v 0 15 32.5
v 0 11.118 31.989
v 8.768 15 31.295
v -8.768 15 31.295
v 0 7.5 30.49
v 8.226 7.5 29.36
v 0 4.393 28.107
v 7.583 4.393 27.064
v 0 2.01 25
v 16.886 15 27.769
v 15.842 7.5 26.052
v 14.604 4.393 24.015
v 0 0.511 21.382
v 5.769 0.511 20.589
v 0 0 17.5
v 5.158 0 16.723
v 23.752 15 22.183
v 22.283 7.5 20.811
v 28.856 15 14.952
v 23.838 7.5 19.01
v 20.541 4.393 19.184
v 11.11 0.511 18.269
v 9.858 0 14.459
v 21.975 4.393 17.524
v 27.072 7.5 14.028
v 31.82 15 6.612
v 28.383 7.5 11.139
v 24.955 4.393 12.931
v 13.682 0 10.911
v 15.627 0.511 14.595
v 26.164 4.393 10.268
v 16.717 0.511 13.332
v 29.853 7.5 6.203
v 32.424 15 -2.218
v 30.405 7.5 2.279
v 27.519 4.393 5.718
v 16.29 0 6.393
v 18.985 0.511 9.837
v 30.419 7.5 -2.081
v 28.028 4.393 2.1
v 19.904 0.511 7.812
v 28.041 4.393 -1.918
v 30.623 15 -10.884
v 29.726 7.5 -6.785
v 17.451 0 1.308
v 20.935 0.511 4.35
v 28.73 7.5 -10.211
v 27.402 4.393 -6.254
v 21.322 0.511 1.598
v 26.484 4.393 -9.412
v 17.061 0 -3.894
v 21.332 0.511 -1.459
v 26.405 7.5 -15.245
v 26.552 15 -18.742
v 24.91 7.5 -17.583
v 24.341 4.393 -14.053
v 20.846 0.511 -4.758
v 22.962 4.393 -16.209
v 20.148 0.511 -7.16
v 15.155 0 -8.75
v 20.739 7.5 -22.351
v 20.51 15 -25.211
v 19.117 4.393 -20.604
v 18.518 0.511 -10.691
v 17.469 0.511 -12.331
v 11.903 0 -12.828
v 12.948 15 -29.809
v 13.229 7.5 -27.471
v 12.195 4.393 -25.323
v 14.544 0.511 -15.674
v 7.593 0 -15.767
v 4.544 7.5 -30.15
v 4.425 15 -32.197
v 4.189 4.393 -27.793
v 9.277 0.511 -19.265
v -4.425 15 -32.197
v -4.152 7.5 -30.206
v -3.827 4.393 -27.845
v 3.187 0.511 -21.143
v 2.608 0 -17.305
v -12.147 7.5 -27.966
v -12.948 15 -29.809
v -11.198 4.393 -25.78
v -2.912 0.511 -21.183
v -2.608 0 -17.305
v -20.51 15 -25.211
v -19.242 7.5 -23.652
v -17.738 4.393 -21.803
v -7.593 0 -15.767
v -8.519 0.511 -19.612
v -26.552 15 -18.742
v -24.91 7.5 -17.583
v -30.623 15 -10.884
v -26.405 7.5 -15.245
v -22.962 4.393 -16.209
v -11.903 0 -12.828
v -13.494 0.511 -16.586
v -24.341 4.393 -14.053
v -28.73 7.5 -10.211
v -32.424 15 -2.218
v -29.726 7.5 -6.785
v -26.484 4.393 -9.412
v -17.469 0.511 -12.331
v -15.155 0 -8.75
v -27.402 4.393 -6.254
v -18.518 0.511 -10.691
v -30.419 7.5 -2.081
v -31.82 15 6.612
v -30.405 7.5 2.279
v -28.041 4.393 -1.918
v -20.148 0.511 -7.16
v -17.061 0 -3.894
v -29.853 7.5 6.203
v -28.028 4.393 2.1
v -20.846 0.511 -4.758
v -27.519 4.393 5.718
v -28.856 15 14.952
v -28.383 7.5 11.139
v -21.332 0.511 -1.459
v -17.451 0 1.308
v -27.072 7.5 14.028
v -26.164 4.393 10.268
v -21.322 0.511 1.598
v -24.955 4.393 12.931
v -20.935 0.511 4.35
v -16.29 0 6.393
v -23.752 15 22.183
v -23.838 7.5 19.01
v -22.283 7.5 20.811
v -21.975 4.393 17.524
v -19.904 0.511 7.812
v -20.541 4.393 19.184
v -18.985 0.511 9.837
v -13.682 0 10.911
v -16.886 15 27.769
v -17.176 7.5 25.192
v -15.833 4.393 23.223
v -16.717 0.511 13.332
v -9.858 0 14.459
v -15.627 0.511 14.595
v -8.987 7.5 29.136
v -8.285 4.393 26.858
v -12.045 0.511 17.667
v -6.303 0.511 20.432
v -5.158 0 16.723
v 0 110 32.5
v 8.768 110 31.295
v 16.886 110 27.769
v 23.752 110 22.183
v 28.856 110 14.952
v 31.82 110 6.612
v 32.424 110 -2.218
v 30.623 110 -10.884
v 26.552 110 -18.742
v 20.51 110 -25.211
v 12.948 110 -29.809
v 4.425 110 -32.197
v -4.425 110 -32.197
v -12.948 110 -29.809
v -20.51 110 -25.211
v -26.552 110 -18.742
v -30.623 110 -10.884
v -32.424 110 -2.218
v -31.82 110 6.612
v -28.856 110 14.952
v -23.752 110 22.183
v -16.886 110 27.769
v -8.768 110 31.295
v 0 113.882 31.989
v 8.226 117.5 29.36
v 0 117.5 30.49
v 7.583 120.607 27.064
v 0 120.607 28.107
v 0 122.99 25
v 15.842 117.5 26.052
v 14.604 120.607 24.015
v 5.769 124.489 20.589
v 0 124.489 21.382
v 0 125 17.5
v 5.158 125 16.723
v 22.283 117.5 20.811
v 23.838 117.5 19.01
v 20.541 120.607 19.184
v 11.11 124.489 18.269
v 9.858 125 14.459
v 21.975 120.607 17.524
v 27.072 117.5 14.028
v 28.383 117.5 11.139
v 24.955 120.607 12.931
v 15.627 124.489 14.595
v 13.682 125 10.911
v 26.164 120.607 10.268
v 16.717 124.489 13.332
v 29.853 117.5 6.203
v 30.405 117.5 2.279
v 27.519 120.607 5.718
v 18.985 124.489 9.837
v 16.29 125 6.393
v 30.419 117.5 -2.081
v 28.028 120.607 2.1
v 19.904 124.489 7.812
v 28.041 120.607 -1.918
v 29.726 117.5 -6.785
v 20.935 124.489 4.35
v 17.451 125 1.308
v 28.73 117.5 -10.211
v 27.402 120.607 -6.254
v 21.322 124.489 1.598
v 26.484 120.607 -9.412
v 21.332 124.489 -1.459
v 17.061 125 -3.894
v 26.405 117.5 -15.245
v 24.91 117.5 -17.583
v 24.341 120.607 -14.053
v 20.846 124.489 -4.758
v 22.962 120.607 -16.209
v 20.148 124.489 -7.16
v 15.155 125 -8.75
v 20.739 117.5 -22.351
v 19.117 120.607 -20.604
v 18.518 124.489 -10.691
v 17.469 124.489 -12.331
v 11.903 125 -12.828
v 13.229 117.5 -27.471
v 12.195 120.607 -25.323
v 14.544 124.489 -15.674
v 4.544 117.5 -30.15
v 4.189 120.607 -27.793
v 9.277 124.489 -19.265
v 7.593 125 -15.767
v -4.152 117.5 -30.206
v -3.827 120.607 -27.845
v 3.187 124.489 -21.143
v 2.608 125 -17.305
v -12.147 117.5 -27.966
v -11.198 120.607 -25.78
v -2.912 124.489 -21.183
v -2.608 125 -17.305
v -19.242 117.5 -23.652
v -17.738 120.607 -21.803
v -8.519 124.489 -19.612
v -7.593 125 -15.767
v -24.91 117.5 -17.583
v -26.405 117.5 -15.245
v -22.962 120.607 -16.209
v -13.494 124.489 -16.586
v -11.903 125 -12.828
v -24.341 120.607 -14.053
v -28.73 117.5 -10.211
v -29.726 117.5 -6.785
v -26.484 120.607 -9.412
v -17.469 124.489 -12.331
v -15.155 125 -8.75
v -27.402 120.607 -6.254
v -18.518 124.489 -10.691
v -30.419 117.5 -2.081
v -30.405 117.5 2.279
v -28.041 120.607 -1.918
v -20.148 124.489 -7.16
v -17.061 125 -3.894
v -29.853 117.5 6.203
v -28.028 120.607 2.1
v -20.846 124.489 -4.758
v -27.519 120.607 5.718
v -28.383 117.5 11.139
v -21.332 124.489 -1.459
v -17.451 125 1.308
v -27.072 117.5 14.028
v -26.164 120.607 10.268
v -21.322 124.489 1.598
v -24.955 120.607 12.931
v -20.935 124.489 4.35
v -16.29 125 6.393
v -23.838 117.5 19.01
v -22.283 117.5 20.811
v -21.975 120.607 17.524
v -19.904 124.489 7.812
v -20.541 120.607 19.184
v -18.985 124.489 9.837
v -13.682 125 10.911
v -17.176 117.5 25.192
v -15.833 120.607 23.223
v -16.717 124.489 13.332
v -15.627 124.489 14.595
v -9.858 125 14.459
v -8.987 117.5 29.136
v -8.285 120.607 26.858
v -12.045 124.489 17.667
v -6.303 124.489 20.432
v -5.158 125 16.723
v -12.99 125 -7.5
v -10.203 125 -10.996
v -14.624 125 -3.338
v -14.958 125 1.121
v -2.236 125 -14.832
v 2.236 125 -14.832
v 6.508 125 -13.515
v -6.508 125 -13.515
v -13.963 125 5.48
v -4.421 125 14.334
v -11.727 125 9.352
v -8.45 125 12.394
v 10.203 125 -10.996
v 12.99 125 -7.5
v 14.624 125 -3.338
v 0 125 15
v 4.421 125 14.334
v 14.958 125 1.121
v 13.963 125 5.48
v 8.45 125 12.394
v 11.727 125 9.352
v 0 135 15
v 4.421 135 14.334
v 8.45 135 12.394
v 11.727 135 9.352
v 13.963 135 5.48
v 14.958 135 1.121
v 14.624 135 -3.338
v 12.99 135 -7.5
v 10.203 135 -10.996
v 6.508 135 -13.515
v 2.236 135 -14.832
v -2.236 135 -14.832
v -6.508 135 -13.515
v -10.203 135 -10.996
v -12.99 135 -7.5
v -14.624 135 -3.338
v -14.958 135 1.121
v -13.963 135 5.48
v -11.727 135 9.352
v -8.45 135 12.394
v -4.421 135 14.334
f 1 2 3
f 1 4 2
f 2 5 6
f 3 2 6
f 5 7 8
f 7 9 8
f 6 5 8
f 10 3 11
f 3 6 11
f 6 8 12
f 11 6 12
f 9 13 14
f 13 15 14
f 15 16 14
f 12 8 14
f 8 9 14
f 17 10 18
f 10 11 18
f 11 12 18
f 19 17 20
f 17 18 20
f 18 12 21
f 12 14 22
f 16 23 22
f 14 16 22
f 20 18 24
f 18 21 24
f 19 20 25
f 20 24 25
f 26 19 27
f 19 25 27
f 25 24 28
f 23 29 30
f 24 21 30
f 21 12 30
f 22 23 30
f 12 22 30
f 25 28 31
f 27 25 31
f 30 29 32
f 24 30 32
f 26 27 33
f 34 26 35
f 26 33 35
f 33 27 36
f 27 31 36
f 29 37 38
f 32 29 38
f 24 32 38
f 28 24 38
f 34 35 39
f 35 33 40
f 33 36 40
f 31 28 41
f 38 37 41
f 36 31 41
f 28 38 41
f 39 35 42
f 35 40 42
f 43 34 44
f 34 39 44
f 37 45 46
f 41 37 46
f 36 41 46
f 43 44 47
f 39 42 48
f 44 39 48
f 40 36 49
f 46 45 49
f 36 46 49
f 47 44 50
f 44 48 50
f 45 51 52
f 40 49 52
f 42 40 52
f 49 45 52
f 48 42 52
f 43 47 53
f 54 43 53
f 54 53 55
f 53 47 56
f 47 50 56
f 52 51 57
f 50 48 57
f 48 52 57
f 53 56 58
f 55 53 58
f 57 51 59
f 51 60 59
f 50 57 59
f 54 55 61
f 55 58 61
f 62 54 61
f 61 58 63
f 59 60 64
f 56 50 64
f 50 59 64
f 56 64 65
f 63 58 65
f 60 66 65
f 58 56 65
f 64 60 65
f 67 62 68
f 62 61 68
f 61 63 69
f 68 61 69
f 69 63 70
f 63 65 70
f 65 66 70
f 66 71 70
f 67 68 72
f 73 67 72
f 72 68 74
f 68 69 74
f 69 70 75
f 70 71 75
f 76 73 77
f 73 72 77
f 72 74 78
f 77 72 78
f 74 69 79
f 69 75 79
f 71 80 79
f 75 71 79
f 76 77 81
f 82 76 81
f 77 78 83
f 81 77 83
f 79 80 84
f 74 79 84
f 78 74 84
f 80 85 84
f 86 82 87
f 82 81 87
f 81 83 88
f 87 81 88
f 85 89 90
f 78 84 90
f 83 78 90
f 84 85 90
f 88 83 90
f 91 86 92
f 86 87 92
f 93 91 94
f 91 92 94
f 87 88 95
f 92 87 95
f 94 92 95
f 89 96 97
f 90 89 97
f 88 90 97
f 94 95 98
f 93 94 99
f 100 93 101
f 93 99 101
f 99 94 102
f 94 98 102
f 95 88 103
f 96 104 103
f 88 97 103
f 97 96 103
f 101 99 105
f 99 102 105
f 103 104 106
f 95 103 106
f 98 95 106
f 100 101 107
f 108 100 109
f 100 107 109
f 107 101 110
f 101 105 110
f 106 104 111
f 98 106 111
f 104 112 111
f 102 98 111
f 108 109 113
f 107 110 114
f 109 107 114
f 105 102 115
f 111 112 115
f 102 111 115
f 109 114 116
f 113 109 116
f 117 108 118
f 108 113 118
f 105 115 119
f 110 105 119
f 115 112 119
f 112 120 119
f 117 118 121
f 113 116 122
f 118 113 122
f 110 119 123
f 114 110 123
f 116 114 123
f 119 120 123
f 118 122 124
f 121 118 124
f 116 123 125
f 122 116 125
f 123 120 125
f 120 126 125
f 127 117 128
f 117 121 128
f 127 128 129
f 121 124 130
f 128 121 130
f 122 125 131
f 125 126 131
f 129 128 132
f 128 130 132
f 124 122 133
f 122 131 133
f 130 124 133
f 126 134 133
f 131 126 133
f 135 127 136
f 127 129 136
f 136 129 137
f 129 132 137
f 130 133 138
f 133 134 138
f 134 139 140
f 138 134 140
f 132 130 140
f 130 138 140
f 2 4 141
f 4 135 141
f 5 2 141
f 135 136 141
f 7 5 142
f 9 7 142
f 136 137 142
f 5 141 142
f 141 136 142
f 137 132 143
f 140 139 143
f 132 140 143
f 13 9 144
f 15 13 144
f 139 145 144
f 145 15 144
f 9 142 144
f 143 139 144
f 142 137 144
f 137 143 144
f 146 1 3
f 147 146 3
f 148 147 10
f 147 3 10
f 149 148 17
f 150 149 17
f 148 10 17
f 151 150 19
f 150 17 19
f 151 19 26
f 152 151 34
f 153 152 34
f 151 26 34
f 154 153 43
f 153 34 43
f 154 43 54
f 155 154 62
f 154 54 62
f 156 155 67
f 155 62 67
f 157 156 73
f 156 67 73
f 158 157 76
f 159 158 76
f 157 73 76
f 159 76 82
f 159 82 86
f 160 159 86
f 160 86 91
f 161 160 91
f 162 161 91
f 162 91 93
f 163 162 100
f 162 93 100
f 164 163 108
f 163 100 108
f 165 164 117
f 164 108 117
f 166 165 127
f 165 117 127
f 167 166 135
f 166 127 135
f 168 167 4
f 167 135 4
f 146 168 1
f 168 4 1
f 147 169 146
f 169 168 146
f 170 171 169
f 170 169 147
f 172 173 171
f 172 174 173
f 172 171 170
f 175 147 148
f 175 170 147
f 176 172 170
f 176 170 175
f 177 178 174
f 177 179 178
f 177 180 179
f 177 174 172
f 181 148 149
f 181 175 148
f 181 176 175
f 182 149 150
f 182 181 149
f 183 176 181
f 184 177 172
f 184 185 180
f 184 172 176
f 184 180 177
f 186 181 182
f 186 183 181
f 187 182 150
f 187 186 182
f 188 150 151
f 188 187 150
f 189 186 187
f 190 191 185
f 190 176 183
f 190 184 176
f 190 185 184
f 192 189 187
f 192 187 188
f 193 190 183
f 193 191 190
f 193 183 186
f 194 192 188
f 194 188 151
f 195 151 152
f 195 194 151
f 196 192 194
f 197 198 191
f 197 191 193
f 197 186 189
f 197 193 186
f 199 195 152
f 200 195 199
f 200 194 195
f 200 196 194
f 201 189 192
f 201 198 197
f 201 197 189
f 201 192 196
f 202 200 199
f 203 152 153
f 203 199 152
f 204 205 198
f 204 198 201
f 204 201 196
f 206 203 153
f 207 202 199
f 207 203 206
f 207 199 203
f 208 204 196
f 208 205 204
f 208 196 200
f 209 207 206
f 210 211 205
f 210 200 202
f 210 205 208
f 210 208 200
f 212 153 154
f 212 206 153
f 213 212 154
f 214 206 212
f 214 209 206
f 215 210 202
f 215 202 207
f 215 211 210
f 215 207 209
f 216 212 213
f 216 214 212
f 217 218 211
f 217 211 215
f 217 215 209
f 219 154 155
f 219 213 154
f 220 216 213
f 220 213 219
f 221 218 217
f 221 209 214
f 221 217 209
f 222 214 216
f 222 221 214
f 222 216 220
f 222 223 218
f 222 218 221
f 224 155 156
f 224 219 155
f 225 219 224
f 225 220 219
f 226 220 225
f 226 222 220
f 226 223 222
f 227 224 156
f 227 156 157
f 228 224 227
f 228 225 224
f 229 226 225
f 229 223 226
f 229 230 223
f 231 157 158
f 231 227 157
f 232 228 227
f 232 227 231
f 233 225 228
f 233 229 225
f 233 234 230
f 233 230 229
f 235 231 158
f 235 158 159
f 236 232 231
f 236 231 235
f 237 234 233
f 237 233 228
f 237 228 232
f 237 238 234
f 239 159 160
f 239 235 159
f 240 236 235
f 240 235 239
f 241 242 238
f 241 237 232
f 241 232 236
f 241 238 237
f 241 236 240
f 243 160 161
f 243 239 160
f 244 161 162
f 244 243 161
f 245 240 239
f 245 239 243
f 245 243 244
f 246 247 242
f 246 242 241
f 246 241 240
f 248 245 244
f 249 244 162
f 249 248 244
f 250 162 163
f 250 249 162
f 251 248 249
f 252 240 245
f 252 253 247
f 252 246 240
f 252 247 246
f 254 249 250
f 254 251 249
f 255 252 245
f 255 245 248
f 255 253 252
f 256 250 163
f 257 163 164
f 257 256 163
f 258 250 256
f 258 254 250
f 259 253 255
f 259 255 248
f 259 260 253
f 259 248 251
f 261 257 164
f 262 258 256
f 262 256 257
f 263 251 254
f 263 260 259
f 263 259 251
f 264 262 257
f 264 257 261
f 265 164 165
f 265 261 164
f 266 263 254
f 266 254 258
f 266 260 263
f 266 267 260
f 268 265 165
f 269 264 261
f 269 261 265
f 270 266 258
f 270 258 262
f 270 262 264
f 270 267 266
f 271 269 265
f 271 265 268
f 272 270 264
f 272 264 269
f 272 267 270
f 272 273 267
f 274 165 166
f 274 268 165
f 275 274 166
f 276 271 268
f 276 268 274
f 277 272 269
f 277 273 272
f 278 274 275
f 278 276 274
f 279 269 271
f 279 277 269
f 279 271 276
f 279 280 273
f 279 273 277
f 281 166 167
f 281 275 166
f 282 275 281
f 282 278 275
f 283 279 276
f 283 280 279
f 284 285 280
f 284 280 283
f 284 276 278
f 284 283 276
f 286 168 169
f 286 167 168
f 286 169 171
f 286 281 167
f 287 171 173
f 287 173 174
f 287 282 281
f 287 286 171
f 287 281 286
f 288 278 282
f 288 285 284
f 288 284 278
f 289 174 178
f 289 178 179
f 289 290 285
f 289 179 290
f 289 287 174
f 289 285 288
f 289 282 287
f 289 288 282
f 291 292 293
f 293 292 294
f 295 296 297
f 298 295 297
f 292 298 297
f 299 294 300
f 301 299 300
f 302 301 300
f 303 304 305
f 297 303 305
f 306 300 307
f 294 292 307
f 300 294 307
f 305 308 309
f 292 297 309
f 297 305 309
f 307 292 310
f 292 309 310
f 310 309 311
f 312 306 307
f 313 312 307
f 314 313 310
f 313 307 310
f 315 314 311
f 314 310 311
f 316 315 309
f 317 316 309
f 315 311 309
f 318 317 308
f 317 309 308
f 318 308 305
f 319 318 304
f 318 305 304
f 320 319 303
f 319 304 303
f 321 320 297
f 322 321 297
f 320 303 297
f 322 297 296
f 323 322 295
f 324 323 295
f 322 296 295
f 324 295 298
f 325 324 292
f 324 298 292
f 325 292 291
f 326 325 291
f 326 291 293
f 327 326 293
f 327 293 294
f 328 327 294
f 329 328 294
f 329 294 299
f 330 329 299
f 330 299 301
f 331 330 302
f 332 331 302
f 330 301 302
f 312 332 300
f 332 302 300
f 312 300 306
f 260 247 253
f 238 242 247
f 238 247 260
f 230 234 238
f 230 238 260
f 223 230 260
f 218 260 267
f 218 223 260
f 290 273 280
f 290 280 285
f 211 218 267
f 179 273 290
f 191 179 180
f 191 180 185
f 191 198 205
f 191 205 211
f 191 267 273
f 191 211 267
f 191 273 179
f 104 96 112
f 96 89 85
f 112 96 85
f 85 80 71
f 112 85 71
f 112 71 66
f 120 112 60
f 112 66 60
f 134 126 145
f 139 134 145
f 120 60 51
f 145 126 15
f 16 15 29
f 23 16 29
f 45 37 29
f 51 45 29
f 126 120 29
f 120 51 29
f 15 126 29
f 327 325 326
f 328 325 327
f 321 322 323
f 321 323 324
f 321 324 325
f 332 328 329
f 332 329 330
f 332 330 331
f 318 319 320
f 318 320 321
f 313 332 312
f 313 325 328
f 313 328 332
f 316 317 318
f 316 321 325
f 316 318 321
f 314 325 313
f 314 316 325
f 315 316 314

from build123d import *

# Parameters (mm, degrees)
SKETCH1_R           = 32.5
BOSS_EXTRUDE1_DEPTH = 125
FILLET1_R           = 15
SKETCH2_R           = 15
BOSS_EXTRUDE2_DEPTH = 10


with BuildPart() as part:
    # Sketch1 → Boss-Extrude1 (new body)
    with BuildSketch(Plane(origin=(0, 0, 0), x_dir=(1, 0, 0), z_dir=(0, 1, 0))):
        with Locations(Location((0, 0, 0), (0, 0, 270))):
            Circle(SKETCH1_R)
    extrude(amount=BOSS_EXTRUDE1_DEPTH)

    # Fillet1
    fillet1_edges = [part.edges().sort_by_distance(p)[0] for p in [
        (0, 0, -32.5),
        (0, 125, -32.5),
    ]]
    fillet(fillet1_edges, radius=FILLET1_R)


with BuildPart() as body_2:
    # Sketch2 → Boss-Extrude2 (new body)
    with BuildSketch(Plane(origin=(0, 125, 0), x_dir=(1, 0, 0), z_dir=(0, 1, 0))):
        with Locations(Location((0, 0, 0), (0, 0, 270))):
            Circle(SKETCH2_R)
    extrude(amount=BOSS_EXTRUDE2_DEPTH)


solid = Compound([part.part, body_2.part])
